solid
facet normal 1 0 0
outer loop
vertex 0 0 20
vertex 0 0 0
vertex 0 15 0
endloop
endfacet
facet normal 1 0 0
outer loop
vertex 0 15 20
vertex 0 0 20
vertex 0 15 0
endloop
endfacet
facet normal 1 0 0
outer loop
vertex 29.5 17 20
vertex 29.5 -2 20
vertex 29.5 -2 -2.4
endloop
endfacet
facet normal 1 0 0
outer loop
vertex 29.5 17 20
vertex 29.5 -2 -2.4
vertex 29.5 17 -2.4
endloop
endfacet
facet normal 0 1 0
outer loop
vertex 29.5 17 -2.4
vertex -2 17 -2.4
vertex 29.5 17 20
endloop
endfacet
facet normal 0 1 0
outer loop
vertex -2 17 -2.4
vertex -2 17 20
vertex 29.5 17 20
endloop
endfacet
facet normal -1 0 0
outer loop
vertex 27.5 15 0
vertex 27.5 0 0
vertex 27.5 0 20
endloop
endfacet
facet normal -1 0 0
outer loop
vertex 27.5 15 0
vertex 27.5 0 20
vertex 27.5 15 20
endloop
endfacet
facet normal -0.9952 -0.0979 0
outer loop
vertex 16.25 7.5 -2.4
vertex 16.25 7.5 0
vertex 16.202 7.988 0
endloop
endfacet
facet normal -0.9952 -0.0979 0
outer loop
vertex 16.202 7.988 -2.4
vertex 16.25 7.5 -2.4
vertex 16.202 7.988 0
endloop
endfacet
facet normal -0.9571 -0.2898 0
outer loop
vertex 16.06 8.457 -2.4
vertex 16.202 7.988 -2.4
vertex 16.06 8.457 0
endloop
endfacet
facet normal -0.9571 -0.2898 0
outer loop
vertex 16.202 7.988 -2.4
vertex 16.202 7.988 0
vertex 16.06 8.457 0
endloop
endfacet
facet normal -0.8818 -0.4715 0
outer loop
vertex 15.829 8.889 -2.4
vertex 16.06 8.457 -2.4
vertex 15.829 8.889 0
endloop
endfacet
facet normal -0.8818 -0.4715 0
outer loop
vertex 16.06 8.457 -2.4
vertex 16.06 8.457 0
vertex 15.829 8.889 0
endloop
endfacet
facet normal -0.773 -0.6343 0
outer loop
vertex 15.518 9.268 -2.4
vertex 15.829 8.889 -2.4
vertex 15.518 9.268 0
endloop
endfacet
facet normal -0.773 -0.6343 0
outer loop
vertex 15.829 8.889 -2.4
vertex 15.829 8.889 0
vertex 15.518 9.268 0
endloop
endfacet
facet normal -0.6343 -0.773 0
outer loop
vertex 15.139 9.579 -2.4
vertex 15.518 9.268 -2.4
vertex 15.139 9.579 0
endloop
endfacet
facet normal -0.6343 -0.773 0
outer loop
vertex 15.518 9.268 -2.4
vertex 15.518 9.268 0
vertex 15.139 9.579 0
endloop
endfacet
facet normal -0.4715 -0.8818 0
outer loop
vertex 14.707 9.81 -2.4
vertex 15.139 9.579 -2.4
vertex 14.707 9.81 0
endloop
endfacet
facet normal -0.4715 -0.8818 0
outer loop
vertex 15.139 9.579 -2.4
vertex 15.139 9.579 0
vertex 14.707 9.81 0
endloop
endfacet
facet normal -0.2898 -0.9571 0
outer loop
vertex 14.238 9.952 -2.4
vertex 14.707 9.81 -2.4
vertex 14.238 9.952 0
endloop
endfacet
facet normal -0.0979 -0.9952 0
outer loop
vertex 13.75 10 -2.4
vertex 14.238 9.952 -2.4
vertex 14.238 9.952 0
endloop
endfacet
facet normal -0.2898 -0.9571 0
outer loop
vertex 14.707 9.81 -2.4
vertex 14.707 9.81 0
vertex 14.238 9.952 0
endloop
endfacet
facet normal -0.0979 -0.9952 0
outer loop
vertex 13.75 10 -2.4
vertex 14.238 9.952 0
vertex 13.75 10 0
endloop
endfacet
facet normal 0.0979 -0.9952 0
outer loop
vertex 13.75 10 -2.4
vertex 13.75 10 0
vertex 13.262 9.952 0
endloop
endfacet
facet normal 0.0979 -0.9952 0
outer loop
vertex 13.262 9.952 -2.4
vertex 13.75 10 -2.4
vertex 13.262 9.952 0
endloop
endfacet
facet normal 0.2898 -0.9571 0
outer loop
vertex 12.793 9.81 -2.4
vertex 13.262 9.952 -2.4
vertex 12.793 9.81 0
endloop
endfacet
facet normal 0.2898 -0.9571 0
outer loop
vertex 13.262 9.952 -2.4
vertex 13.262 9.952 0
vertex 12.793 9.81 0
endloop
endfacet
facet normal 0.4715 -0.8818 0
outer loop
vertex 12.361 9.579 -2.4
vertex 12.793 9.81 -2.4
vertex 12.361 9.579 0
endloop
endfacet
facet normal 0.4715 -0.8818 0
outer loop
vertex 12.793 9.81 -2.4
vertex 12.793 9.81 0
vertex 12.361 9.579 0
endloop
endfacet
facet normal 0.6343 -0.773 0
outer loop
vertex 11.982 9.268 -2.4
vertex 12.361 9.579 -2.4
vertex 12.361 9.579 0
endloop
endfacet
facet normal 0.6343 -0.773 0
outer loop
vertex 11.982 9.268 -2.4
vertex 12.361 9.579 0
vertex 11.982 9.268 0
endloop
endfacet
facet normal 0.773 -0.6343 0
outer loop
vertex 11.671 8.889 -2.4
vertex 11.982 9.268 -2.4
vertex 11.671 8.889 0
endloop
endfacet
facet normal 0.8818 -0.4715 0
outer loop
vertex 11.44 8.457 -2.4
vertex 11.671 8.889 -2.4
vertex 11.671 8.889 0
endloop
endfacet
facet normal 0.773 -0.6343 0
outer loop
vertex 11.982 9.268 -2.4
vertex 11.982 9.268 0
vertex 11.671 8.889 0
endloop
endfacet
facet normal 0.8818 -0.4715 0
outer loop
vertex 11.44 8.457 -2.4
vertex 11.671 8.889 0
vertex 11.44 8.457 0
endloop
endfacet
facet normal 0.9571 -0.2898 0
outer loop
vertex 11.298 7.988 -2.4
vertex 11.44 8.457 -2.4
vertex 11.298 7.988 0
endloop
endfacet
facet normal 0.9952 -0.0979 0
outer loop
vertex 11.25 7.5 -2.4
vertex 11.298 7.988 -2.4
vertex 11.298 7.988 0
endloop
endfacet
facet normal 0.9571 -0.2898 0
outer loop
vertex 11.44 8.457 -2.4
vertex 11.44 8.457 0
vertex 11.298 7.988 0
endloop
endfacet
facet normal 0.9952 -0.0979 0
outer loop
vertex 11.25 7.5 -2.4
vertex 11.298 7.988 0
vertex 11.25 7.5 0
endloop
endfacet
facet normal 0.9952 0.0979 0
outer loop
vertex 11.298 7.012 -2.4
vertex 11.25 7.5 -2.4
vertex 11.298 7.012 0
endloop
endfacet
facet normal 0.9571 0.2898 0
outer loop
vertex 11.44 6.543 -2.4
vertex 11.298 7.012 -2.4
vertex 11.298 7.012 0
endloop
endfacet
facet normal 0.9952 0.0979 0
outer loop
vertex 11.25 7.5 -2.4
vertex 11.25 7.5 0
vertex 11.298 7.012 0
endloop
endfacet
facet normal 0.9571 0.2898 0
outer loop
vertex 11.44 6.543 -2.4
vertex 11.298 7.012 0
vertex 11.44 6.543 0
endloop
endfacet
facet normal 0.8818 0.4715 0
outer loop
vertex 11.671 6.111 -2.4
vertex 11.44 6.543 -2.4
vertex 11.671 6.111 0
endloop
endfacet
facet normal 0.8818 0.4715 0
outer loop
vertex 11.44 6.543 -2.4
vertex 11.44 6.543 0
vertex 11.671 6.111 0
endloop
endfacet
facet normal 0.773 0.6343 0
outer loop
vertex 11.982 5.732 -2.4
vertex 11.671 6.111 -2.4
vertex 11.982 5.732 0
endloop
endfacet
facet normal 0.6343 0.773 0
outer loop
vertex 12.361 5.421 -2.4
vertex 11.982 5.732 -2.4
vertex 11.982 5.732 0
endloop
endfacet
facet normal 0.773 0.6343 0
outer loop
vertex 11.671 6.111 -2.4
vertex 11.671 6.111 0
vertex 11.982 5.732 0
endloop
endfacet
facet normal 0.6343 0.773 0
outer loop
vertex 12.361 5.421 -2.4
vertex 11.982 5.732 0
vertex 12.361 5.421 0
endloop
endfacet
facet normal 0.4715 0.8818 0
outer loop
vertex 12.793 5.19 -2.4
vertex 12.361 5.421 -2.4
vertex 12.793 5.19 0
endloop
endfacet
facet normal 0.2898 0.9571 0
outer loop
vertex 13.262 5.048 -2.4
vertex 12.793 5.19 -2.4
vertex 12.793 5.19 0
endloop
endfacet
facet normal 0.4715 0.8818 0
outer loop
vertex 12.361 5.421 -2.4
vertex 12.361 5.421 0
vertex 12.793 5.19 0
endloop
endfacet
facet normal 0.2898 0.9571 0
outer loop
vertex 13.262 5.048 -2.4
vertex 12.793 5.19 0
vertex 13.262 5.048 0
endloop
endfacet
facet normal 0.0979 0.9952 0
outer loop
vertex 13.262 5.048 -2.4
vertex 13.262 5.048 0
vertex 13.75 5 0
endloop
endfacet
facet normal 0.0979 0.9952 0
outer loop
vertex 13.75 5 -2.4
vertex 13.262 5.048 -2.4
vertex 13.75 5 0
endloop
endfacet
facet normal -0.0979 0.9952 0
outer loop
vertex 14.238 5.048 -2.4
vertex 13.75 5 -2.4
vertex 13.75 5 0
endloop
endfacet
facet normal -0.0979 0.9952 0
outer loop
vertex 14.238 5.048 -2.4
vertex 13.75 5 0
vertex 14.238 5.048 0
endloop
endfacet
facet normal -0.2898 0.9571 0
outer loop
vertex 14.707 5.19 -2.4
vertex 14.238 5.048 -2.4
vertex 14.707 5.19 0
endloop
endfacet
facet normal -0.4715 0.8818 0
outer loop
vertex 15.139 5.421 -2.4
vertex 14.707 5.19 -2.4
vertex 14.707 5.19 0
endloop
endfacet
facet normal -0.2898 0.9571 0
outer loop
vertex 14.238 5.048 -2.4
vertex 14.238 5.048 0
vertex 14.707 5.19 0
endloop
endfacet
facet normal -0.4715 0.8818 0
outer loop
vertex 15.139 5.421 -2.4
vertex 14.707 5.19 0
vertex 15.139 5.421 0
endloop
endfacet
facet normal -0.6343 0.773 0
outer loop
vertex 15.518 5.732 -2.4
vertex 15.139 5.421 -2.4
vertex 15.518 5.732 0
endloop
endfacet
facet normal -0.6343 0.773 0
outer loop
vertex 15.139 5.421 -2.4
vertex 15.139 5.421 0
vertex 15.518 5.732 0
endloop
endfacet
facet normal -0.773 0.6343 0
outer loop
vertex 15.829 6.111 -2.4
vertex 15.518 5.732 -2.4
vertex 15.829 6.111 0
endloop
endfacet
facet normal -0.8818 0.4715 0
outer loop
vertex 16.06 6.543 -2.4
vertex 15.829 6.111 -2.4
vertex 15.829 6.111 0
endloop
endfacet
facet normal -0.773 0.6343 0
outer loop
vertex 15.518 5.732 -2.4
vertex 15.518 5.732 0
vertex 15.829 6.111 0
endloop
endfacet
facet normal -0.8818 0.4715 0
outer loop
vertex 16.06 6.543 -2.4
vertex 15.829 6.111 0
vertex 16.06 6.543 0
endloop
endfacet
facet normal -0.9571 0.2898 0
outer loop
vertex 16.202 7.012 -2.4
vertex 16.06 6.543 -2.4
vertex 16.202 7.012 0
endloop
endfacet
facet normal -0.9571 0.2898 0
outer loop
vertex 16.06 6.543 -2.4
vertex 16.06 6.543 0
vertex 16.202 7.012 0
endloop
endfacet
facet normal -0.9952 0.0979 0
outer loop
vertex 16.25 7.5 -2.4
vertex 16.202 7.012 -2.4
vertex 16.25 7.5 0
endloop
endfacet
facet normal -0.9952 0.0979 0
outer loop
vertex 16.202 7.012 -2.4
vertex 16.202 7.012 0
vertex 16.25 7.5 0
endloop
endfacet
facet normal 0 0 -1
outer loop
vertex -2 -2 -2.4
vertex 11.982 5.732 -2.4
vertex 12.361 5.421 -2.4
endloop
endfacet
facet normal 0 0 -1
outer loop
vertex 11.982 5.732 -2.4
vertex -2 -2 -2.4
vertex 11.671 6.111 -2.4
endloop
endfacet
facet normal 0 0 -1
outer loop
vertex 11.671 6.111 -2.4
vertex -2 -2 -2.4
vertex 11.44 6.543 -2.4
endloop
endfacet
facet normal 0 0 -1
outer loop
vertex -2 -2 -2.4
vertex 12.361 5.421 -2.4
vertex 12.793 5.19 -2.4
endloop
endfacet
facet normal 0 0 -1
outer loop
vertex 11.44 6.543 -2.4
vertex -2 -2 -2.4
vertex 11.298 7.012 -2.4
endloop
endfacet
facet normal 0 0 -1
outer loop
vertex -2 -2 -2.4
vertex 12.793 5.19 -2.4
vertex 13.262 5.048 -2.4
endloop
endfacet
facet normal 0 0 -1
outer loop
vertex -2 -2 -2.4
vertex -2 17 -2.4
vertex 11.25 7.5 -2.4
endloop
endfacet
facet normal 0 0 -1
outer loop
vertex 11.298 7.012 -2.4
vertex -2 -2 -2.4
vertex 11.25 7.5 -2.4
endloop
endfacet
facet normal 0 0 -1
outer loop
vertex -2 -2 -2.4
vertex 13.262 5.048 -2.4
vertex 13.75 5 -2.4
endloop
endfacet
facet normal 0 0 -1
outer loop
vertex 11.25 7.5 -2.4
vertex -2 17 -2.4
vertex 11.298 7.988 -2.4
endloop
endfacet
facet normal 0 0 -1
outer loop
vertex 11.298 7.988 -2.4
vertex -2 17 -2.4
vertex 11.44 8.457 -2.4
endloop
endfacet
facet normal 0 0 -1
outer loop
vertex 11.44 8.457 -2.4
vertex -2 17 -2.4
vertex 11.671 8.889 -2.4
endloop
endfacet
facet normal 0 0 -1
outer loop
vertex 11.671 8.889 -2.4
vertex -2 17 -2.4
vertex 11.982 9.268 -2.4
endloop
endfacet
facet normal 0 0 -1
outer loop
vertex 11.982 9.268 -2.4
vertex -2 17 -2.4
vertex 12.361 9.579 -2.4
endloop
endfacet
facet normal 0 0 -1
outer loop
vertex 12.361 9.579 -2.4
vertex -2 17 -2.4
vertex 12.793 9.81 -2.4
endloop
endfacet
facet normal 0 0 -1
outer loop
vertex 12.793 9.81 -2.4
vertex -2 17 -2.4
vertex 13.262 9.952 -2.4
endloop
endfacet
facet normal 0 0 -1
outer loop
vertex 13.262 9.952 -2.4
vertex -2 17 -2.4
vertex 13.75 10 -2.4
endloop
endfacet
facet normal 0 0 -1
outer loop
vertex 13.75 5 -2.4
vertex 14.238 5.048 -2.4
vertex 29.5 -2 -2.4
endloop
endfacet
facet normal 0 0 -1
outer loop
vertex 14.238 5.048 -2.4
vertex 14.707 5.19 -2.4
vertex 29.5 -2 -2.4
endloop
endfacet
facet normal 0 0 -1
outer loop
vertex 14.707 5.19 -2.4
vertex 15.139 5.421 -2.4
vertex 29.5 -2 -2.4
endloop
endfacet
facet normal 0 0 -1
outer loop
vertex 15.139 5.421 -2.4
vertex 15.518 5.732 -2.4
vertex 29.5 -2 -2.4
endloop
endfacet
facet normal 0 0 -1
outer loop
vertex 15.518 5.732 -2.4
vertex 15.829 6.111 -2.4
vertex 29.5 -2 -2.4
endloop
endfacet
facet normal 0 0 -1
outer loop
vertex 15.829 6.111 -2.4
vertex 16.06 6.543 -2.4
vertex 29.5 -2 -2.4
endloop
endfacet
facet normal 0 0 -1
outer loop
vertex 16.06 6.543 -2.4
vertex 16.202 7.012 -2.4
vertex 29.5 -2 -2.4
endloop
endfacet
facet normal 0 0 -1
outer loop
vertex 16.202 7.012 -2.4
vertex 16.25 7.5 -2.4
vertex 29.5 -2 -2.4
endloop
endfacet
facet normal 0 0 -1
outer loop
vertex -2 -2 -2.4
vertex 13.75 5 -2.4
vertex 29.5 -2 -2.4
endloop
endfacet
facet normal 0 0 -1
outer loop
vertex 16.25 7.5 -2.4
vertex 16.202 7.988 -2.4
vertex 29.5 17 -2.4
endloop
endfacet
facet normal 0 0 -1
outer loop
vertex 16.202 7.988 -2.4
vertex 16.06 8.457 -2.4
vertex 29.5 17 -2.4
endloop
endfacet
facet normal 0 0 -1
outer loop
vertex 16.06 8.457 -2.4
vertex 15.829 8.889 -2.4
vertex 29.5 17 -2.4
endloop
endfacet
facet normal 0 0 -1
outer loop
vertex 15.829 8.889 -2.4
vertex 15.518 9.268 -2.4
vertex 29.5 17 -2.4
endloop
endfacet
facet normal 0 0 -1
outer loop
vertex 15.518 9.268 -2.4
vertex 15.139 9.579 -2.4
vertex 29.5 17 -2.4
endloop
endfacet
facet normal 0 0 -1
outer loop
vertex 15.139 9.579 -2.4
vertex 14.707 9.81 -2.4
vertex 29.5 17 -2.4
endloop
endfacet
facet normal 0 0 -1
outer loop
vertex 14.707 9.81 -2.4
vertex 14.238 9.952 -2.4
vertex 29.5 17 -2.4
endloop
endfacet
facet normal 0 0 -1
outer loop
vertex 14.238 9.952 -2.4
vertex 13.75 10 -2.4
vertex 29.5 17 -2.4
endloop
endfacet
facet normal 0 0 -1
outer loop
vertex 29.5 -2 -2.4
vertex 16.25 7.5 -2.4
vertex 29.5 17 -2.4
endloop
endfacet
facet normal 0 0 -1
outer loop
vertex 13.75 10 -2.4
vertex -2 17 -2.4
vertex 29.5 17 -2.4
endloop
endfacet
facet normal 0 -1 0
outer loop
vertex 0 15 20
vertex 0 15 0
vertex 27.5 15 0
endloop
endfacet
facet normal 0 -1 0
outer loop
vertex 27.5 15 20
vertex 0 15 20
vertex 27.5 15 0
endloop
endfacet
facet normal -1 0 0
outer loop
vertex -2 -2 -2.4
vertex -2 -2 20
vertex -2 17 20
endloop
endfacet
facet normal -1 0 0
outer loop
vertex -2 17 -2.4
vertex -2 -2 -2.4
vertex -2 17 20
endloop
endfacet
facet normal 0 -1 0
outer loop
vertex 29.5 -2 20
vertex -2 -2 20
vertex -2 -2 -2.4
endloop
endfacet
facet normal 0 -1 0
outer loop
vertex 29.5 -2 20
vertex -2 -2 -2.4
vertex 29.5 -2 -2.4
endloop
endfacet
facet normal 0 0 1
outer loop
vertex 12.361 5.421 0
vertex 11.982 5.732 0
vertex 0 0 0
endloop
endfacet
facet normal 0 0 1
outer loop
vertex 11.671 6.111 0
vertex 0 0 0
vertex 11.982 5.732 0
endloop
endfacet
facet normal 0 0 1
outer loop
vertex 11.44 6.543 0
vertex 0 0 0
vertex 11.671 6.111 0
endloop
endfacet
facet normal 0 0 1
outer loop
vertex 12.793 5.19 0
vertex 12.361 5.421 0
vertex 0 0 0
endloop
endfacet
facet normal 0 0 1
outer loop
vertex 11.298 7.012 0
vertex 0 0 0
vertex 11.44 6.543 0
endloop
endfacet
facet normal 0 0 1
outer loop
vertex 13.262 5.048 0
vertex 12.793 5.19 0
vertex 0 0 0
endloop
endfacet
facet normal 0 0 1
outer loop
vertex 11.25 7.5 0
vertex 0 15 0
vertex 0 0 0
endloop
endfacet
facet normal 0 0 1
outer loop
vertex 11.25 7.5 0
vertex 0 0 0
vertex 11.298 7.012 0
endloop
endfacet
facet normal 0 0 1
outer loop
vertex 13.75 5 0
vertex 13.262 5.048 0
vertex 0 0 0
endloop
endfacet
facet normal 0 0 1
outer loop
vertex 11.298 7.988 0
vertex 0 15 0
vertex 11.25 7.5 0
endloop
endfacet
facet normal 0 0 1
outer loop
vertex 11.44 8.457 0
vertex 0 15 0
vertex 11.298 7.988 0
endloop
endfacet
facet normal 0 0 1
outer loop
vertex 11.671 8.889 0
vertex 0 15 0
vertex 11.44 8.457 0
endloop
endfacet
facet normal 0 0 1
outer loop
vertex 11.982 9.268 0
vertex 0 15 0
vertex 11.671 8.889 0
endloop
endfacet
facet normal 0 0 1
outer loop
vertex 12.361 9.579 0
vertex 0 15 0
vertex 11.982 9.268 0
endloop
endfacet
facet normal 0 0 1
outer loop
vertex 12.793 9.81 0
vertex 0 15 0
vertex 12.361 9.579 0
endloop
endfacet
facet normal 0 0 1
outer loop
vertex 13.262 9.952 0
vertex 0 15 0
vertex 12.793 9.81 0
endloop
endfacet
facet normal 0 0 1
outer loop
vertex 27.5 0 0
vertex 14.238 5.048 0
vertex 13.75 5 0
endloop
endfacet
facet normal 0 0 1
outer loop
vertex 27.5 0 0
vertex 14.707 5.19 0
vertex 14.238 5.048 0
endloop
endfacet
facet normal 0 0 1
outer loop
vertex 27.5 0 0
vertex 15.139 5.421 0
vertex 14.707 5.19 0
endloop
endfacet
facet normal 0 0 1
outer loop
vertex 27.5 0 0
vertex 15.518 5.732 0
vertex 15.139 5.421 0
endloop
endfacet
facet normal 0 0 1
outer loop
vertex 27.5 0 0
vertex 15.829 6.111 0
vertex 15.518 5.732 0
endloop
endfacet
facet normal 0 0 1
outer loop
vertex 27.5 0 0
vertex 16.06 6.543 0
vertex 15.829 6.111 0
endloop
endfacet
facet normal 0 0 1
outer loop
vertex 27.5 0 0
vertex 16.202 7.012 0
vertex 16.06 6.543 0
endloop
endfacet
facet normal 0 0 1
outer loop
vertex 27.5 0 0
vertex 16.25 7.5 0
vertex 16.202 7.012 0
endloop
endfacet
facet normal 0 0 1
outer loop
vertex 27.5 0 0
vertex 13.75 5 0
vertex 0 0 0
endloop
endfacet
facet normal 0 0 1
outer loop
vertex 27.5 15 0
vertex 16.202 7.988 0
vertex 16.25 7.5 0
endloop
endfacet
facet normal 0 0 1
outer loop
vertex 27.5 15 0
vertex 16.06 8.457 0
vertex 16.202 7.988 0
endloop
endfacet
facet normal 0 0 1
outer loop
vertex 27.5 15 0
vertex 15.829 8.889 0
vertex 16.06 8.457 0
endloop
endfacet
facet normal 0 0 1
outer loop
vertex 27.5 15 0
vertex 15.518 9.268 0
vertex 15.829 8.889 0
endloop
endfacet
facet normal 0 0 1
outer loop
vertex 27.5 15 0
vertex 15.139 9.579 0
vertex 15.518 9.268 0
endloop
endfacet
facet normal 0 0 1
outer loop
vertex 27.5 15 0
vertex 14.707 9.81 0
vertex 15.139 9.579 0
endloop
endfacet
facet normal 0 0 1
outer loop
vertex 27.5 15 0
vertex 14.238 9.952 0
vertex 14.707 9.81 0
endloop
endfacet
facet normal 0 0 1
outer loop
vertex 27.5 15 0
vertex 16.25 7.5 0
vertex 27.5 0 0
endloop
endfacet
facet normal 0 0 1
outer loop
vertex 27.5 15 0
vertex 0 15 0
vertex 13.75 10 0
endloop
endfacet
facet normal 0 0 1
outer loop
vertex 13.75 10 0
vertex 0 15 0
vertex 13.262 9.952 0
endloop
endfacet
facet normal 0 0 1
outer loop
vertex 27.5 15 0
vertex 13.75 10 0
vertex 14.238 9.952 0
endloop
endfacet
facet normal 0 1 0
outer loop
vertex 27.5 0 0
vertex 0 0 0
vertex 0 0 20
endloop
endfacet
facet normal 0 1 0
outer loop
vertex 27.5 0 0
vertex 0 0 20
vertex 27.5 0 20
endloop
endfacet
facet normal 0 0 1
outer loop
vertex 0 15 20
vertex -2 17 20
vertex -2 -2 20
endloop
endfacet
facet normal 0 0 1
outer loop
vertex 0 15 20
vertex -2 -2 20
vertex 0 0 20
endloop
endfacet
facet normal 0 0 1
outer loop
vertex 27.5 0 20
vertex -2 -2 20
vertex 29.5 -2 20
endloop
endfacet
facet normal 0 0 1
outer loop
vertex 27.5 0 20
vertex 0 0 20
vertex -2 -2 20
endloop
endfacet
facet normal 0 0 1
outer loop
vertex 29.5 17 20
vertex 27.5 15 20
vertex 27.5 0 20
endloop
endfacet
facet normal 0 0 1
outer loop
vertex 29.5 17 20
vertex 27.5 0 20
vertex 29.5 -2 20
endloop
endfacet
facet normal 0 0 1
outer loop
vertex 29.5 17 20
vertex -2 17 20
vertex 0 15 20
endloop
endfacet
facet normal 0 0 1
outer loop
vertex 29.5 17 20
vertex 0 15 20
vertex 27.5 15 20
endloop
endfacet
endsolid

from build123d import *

# Parameters (mm, degrees)
F0_W     = 31.5
F0_H     = 19
F0_W_2   = 27.5
F0_H_2   = 15
F1_DEPTH = 20
F0_R     = 2.5
F2_DEPTH = 2.4


with BuildPart() as f1:
    # F0 (on Top) → F1 (new body)
    with BuildSketch(Plane.XY):
        with Locations((13.75, 7.5)):
            Rectangle(F0_W, F0_H)
        with Locations((13.75, 7.5)):
            Rectangle(F0_W_2, F0_H_2, mode=Mode.SUBTRACT)
    extrude(amount=F1_DEPTH)

    # F0 (on Top) → F2 (join)
    with BuildSketch(Plane.XY):
        with Locations((13.75, 7.5)):
            Rectangle(F0_W, F0_H)
        with Locations((13.75, 7.5)):
            Rectangle(F0_W_2, F0_H_2, mode=Mode.SUBTRACT)
        with Locations((13.75, 7.5)):
            Rectangle(F0_W_2, F0_H_2)
        with Locations((13.75, 7.5)):
            Circle(F0_R, mode=Mode.SUBTRACT)
    extrude(amount=-F2_DEPTH)


solid = f1.part
